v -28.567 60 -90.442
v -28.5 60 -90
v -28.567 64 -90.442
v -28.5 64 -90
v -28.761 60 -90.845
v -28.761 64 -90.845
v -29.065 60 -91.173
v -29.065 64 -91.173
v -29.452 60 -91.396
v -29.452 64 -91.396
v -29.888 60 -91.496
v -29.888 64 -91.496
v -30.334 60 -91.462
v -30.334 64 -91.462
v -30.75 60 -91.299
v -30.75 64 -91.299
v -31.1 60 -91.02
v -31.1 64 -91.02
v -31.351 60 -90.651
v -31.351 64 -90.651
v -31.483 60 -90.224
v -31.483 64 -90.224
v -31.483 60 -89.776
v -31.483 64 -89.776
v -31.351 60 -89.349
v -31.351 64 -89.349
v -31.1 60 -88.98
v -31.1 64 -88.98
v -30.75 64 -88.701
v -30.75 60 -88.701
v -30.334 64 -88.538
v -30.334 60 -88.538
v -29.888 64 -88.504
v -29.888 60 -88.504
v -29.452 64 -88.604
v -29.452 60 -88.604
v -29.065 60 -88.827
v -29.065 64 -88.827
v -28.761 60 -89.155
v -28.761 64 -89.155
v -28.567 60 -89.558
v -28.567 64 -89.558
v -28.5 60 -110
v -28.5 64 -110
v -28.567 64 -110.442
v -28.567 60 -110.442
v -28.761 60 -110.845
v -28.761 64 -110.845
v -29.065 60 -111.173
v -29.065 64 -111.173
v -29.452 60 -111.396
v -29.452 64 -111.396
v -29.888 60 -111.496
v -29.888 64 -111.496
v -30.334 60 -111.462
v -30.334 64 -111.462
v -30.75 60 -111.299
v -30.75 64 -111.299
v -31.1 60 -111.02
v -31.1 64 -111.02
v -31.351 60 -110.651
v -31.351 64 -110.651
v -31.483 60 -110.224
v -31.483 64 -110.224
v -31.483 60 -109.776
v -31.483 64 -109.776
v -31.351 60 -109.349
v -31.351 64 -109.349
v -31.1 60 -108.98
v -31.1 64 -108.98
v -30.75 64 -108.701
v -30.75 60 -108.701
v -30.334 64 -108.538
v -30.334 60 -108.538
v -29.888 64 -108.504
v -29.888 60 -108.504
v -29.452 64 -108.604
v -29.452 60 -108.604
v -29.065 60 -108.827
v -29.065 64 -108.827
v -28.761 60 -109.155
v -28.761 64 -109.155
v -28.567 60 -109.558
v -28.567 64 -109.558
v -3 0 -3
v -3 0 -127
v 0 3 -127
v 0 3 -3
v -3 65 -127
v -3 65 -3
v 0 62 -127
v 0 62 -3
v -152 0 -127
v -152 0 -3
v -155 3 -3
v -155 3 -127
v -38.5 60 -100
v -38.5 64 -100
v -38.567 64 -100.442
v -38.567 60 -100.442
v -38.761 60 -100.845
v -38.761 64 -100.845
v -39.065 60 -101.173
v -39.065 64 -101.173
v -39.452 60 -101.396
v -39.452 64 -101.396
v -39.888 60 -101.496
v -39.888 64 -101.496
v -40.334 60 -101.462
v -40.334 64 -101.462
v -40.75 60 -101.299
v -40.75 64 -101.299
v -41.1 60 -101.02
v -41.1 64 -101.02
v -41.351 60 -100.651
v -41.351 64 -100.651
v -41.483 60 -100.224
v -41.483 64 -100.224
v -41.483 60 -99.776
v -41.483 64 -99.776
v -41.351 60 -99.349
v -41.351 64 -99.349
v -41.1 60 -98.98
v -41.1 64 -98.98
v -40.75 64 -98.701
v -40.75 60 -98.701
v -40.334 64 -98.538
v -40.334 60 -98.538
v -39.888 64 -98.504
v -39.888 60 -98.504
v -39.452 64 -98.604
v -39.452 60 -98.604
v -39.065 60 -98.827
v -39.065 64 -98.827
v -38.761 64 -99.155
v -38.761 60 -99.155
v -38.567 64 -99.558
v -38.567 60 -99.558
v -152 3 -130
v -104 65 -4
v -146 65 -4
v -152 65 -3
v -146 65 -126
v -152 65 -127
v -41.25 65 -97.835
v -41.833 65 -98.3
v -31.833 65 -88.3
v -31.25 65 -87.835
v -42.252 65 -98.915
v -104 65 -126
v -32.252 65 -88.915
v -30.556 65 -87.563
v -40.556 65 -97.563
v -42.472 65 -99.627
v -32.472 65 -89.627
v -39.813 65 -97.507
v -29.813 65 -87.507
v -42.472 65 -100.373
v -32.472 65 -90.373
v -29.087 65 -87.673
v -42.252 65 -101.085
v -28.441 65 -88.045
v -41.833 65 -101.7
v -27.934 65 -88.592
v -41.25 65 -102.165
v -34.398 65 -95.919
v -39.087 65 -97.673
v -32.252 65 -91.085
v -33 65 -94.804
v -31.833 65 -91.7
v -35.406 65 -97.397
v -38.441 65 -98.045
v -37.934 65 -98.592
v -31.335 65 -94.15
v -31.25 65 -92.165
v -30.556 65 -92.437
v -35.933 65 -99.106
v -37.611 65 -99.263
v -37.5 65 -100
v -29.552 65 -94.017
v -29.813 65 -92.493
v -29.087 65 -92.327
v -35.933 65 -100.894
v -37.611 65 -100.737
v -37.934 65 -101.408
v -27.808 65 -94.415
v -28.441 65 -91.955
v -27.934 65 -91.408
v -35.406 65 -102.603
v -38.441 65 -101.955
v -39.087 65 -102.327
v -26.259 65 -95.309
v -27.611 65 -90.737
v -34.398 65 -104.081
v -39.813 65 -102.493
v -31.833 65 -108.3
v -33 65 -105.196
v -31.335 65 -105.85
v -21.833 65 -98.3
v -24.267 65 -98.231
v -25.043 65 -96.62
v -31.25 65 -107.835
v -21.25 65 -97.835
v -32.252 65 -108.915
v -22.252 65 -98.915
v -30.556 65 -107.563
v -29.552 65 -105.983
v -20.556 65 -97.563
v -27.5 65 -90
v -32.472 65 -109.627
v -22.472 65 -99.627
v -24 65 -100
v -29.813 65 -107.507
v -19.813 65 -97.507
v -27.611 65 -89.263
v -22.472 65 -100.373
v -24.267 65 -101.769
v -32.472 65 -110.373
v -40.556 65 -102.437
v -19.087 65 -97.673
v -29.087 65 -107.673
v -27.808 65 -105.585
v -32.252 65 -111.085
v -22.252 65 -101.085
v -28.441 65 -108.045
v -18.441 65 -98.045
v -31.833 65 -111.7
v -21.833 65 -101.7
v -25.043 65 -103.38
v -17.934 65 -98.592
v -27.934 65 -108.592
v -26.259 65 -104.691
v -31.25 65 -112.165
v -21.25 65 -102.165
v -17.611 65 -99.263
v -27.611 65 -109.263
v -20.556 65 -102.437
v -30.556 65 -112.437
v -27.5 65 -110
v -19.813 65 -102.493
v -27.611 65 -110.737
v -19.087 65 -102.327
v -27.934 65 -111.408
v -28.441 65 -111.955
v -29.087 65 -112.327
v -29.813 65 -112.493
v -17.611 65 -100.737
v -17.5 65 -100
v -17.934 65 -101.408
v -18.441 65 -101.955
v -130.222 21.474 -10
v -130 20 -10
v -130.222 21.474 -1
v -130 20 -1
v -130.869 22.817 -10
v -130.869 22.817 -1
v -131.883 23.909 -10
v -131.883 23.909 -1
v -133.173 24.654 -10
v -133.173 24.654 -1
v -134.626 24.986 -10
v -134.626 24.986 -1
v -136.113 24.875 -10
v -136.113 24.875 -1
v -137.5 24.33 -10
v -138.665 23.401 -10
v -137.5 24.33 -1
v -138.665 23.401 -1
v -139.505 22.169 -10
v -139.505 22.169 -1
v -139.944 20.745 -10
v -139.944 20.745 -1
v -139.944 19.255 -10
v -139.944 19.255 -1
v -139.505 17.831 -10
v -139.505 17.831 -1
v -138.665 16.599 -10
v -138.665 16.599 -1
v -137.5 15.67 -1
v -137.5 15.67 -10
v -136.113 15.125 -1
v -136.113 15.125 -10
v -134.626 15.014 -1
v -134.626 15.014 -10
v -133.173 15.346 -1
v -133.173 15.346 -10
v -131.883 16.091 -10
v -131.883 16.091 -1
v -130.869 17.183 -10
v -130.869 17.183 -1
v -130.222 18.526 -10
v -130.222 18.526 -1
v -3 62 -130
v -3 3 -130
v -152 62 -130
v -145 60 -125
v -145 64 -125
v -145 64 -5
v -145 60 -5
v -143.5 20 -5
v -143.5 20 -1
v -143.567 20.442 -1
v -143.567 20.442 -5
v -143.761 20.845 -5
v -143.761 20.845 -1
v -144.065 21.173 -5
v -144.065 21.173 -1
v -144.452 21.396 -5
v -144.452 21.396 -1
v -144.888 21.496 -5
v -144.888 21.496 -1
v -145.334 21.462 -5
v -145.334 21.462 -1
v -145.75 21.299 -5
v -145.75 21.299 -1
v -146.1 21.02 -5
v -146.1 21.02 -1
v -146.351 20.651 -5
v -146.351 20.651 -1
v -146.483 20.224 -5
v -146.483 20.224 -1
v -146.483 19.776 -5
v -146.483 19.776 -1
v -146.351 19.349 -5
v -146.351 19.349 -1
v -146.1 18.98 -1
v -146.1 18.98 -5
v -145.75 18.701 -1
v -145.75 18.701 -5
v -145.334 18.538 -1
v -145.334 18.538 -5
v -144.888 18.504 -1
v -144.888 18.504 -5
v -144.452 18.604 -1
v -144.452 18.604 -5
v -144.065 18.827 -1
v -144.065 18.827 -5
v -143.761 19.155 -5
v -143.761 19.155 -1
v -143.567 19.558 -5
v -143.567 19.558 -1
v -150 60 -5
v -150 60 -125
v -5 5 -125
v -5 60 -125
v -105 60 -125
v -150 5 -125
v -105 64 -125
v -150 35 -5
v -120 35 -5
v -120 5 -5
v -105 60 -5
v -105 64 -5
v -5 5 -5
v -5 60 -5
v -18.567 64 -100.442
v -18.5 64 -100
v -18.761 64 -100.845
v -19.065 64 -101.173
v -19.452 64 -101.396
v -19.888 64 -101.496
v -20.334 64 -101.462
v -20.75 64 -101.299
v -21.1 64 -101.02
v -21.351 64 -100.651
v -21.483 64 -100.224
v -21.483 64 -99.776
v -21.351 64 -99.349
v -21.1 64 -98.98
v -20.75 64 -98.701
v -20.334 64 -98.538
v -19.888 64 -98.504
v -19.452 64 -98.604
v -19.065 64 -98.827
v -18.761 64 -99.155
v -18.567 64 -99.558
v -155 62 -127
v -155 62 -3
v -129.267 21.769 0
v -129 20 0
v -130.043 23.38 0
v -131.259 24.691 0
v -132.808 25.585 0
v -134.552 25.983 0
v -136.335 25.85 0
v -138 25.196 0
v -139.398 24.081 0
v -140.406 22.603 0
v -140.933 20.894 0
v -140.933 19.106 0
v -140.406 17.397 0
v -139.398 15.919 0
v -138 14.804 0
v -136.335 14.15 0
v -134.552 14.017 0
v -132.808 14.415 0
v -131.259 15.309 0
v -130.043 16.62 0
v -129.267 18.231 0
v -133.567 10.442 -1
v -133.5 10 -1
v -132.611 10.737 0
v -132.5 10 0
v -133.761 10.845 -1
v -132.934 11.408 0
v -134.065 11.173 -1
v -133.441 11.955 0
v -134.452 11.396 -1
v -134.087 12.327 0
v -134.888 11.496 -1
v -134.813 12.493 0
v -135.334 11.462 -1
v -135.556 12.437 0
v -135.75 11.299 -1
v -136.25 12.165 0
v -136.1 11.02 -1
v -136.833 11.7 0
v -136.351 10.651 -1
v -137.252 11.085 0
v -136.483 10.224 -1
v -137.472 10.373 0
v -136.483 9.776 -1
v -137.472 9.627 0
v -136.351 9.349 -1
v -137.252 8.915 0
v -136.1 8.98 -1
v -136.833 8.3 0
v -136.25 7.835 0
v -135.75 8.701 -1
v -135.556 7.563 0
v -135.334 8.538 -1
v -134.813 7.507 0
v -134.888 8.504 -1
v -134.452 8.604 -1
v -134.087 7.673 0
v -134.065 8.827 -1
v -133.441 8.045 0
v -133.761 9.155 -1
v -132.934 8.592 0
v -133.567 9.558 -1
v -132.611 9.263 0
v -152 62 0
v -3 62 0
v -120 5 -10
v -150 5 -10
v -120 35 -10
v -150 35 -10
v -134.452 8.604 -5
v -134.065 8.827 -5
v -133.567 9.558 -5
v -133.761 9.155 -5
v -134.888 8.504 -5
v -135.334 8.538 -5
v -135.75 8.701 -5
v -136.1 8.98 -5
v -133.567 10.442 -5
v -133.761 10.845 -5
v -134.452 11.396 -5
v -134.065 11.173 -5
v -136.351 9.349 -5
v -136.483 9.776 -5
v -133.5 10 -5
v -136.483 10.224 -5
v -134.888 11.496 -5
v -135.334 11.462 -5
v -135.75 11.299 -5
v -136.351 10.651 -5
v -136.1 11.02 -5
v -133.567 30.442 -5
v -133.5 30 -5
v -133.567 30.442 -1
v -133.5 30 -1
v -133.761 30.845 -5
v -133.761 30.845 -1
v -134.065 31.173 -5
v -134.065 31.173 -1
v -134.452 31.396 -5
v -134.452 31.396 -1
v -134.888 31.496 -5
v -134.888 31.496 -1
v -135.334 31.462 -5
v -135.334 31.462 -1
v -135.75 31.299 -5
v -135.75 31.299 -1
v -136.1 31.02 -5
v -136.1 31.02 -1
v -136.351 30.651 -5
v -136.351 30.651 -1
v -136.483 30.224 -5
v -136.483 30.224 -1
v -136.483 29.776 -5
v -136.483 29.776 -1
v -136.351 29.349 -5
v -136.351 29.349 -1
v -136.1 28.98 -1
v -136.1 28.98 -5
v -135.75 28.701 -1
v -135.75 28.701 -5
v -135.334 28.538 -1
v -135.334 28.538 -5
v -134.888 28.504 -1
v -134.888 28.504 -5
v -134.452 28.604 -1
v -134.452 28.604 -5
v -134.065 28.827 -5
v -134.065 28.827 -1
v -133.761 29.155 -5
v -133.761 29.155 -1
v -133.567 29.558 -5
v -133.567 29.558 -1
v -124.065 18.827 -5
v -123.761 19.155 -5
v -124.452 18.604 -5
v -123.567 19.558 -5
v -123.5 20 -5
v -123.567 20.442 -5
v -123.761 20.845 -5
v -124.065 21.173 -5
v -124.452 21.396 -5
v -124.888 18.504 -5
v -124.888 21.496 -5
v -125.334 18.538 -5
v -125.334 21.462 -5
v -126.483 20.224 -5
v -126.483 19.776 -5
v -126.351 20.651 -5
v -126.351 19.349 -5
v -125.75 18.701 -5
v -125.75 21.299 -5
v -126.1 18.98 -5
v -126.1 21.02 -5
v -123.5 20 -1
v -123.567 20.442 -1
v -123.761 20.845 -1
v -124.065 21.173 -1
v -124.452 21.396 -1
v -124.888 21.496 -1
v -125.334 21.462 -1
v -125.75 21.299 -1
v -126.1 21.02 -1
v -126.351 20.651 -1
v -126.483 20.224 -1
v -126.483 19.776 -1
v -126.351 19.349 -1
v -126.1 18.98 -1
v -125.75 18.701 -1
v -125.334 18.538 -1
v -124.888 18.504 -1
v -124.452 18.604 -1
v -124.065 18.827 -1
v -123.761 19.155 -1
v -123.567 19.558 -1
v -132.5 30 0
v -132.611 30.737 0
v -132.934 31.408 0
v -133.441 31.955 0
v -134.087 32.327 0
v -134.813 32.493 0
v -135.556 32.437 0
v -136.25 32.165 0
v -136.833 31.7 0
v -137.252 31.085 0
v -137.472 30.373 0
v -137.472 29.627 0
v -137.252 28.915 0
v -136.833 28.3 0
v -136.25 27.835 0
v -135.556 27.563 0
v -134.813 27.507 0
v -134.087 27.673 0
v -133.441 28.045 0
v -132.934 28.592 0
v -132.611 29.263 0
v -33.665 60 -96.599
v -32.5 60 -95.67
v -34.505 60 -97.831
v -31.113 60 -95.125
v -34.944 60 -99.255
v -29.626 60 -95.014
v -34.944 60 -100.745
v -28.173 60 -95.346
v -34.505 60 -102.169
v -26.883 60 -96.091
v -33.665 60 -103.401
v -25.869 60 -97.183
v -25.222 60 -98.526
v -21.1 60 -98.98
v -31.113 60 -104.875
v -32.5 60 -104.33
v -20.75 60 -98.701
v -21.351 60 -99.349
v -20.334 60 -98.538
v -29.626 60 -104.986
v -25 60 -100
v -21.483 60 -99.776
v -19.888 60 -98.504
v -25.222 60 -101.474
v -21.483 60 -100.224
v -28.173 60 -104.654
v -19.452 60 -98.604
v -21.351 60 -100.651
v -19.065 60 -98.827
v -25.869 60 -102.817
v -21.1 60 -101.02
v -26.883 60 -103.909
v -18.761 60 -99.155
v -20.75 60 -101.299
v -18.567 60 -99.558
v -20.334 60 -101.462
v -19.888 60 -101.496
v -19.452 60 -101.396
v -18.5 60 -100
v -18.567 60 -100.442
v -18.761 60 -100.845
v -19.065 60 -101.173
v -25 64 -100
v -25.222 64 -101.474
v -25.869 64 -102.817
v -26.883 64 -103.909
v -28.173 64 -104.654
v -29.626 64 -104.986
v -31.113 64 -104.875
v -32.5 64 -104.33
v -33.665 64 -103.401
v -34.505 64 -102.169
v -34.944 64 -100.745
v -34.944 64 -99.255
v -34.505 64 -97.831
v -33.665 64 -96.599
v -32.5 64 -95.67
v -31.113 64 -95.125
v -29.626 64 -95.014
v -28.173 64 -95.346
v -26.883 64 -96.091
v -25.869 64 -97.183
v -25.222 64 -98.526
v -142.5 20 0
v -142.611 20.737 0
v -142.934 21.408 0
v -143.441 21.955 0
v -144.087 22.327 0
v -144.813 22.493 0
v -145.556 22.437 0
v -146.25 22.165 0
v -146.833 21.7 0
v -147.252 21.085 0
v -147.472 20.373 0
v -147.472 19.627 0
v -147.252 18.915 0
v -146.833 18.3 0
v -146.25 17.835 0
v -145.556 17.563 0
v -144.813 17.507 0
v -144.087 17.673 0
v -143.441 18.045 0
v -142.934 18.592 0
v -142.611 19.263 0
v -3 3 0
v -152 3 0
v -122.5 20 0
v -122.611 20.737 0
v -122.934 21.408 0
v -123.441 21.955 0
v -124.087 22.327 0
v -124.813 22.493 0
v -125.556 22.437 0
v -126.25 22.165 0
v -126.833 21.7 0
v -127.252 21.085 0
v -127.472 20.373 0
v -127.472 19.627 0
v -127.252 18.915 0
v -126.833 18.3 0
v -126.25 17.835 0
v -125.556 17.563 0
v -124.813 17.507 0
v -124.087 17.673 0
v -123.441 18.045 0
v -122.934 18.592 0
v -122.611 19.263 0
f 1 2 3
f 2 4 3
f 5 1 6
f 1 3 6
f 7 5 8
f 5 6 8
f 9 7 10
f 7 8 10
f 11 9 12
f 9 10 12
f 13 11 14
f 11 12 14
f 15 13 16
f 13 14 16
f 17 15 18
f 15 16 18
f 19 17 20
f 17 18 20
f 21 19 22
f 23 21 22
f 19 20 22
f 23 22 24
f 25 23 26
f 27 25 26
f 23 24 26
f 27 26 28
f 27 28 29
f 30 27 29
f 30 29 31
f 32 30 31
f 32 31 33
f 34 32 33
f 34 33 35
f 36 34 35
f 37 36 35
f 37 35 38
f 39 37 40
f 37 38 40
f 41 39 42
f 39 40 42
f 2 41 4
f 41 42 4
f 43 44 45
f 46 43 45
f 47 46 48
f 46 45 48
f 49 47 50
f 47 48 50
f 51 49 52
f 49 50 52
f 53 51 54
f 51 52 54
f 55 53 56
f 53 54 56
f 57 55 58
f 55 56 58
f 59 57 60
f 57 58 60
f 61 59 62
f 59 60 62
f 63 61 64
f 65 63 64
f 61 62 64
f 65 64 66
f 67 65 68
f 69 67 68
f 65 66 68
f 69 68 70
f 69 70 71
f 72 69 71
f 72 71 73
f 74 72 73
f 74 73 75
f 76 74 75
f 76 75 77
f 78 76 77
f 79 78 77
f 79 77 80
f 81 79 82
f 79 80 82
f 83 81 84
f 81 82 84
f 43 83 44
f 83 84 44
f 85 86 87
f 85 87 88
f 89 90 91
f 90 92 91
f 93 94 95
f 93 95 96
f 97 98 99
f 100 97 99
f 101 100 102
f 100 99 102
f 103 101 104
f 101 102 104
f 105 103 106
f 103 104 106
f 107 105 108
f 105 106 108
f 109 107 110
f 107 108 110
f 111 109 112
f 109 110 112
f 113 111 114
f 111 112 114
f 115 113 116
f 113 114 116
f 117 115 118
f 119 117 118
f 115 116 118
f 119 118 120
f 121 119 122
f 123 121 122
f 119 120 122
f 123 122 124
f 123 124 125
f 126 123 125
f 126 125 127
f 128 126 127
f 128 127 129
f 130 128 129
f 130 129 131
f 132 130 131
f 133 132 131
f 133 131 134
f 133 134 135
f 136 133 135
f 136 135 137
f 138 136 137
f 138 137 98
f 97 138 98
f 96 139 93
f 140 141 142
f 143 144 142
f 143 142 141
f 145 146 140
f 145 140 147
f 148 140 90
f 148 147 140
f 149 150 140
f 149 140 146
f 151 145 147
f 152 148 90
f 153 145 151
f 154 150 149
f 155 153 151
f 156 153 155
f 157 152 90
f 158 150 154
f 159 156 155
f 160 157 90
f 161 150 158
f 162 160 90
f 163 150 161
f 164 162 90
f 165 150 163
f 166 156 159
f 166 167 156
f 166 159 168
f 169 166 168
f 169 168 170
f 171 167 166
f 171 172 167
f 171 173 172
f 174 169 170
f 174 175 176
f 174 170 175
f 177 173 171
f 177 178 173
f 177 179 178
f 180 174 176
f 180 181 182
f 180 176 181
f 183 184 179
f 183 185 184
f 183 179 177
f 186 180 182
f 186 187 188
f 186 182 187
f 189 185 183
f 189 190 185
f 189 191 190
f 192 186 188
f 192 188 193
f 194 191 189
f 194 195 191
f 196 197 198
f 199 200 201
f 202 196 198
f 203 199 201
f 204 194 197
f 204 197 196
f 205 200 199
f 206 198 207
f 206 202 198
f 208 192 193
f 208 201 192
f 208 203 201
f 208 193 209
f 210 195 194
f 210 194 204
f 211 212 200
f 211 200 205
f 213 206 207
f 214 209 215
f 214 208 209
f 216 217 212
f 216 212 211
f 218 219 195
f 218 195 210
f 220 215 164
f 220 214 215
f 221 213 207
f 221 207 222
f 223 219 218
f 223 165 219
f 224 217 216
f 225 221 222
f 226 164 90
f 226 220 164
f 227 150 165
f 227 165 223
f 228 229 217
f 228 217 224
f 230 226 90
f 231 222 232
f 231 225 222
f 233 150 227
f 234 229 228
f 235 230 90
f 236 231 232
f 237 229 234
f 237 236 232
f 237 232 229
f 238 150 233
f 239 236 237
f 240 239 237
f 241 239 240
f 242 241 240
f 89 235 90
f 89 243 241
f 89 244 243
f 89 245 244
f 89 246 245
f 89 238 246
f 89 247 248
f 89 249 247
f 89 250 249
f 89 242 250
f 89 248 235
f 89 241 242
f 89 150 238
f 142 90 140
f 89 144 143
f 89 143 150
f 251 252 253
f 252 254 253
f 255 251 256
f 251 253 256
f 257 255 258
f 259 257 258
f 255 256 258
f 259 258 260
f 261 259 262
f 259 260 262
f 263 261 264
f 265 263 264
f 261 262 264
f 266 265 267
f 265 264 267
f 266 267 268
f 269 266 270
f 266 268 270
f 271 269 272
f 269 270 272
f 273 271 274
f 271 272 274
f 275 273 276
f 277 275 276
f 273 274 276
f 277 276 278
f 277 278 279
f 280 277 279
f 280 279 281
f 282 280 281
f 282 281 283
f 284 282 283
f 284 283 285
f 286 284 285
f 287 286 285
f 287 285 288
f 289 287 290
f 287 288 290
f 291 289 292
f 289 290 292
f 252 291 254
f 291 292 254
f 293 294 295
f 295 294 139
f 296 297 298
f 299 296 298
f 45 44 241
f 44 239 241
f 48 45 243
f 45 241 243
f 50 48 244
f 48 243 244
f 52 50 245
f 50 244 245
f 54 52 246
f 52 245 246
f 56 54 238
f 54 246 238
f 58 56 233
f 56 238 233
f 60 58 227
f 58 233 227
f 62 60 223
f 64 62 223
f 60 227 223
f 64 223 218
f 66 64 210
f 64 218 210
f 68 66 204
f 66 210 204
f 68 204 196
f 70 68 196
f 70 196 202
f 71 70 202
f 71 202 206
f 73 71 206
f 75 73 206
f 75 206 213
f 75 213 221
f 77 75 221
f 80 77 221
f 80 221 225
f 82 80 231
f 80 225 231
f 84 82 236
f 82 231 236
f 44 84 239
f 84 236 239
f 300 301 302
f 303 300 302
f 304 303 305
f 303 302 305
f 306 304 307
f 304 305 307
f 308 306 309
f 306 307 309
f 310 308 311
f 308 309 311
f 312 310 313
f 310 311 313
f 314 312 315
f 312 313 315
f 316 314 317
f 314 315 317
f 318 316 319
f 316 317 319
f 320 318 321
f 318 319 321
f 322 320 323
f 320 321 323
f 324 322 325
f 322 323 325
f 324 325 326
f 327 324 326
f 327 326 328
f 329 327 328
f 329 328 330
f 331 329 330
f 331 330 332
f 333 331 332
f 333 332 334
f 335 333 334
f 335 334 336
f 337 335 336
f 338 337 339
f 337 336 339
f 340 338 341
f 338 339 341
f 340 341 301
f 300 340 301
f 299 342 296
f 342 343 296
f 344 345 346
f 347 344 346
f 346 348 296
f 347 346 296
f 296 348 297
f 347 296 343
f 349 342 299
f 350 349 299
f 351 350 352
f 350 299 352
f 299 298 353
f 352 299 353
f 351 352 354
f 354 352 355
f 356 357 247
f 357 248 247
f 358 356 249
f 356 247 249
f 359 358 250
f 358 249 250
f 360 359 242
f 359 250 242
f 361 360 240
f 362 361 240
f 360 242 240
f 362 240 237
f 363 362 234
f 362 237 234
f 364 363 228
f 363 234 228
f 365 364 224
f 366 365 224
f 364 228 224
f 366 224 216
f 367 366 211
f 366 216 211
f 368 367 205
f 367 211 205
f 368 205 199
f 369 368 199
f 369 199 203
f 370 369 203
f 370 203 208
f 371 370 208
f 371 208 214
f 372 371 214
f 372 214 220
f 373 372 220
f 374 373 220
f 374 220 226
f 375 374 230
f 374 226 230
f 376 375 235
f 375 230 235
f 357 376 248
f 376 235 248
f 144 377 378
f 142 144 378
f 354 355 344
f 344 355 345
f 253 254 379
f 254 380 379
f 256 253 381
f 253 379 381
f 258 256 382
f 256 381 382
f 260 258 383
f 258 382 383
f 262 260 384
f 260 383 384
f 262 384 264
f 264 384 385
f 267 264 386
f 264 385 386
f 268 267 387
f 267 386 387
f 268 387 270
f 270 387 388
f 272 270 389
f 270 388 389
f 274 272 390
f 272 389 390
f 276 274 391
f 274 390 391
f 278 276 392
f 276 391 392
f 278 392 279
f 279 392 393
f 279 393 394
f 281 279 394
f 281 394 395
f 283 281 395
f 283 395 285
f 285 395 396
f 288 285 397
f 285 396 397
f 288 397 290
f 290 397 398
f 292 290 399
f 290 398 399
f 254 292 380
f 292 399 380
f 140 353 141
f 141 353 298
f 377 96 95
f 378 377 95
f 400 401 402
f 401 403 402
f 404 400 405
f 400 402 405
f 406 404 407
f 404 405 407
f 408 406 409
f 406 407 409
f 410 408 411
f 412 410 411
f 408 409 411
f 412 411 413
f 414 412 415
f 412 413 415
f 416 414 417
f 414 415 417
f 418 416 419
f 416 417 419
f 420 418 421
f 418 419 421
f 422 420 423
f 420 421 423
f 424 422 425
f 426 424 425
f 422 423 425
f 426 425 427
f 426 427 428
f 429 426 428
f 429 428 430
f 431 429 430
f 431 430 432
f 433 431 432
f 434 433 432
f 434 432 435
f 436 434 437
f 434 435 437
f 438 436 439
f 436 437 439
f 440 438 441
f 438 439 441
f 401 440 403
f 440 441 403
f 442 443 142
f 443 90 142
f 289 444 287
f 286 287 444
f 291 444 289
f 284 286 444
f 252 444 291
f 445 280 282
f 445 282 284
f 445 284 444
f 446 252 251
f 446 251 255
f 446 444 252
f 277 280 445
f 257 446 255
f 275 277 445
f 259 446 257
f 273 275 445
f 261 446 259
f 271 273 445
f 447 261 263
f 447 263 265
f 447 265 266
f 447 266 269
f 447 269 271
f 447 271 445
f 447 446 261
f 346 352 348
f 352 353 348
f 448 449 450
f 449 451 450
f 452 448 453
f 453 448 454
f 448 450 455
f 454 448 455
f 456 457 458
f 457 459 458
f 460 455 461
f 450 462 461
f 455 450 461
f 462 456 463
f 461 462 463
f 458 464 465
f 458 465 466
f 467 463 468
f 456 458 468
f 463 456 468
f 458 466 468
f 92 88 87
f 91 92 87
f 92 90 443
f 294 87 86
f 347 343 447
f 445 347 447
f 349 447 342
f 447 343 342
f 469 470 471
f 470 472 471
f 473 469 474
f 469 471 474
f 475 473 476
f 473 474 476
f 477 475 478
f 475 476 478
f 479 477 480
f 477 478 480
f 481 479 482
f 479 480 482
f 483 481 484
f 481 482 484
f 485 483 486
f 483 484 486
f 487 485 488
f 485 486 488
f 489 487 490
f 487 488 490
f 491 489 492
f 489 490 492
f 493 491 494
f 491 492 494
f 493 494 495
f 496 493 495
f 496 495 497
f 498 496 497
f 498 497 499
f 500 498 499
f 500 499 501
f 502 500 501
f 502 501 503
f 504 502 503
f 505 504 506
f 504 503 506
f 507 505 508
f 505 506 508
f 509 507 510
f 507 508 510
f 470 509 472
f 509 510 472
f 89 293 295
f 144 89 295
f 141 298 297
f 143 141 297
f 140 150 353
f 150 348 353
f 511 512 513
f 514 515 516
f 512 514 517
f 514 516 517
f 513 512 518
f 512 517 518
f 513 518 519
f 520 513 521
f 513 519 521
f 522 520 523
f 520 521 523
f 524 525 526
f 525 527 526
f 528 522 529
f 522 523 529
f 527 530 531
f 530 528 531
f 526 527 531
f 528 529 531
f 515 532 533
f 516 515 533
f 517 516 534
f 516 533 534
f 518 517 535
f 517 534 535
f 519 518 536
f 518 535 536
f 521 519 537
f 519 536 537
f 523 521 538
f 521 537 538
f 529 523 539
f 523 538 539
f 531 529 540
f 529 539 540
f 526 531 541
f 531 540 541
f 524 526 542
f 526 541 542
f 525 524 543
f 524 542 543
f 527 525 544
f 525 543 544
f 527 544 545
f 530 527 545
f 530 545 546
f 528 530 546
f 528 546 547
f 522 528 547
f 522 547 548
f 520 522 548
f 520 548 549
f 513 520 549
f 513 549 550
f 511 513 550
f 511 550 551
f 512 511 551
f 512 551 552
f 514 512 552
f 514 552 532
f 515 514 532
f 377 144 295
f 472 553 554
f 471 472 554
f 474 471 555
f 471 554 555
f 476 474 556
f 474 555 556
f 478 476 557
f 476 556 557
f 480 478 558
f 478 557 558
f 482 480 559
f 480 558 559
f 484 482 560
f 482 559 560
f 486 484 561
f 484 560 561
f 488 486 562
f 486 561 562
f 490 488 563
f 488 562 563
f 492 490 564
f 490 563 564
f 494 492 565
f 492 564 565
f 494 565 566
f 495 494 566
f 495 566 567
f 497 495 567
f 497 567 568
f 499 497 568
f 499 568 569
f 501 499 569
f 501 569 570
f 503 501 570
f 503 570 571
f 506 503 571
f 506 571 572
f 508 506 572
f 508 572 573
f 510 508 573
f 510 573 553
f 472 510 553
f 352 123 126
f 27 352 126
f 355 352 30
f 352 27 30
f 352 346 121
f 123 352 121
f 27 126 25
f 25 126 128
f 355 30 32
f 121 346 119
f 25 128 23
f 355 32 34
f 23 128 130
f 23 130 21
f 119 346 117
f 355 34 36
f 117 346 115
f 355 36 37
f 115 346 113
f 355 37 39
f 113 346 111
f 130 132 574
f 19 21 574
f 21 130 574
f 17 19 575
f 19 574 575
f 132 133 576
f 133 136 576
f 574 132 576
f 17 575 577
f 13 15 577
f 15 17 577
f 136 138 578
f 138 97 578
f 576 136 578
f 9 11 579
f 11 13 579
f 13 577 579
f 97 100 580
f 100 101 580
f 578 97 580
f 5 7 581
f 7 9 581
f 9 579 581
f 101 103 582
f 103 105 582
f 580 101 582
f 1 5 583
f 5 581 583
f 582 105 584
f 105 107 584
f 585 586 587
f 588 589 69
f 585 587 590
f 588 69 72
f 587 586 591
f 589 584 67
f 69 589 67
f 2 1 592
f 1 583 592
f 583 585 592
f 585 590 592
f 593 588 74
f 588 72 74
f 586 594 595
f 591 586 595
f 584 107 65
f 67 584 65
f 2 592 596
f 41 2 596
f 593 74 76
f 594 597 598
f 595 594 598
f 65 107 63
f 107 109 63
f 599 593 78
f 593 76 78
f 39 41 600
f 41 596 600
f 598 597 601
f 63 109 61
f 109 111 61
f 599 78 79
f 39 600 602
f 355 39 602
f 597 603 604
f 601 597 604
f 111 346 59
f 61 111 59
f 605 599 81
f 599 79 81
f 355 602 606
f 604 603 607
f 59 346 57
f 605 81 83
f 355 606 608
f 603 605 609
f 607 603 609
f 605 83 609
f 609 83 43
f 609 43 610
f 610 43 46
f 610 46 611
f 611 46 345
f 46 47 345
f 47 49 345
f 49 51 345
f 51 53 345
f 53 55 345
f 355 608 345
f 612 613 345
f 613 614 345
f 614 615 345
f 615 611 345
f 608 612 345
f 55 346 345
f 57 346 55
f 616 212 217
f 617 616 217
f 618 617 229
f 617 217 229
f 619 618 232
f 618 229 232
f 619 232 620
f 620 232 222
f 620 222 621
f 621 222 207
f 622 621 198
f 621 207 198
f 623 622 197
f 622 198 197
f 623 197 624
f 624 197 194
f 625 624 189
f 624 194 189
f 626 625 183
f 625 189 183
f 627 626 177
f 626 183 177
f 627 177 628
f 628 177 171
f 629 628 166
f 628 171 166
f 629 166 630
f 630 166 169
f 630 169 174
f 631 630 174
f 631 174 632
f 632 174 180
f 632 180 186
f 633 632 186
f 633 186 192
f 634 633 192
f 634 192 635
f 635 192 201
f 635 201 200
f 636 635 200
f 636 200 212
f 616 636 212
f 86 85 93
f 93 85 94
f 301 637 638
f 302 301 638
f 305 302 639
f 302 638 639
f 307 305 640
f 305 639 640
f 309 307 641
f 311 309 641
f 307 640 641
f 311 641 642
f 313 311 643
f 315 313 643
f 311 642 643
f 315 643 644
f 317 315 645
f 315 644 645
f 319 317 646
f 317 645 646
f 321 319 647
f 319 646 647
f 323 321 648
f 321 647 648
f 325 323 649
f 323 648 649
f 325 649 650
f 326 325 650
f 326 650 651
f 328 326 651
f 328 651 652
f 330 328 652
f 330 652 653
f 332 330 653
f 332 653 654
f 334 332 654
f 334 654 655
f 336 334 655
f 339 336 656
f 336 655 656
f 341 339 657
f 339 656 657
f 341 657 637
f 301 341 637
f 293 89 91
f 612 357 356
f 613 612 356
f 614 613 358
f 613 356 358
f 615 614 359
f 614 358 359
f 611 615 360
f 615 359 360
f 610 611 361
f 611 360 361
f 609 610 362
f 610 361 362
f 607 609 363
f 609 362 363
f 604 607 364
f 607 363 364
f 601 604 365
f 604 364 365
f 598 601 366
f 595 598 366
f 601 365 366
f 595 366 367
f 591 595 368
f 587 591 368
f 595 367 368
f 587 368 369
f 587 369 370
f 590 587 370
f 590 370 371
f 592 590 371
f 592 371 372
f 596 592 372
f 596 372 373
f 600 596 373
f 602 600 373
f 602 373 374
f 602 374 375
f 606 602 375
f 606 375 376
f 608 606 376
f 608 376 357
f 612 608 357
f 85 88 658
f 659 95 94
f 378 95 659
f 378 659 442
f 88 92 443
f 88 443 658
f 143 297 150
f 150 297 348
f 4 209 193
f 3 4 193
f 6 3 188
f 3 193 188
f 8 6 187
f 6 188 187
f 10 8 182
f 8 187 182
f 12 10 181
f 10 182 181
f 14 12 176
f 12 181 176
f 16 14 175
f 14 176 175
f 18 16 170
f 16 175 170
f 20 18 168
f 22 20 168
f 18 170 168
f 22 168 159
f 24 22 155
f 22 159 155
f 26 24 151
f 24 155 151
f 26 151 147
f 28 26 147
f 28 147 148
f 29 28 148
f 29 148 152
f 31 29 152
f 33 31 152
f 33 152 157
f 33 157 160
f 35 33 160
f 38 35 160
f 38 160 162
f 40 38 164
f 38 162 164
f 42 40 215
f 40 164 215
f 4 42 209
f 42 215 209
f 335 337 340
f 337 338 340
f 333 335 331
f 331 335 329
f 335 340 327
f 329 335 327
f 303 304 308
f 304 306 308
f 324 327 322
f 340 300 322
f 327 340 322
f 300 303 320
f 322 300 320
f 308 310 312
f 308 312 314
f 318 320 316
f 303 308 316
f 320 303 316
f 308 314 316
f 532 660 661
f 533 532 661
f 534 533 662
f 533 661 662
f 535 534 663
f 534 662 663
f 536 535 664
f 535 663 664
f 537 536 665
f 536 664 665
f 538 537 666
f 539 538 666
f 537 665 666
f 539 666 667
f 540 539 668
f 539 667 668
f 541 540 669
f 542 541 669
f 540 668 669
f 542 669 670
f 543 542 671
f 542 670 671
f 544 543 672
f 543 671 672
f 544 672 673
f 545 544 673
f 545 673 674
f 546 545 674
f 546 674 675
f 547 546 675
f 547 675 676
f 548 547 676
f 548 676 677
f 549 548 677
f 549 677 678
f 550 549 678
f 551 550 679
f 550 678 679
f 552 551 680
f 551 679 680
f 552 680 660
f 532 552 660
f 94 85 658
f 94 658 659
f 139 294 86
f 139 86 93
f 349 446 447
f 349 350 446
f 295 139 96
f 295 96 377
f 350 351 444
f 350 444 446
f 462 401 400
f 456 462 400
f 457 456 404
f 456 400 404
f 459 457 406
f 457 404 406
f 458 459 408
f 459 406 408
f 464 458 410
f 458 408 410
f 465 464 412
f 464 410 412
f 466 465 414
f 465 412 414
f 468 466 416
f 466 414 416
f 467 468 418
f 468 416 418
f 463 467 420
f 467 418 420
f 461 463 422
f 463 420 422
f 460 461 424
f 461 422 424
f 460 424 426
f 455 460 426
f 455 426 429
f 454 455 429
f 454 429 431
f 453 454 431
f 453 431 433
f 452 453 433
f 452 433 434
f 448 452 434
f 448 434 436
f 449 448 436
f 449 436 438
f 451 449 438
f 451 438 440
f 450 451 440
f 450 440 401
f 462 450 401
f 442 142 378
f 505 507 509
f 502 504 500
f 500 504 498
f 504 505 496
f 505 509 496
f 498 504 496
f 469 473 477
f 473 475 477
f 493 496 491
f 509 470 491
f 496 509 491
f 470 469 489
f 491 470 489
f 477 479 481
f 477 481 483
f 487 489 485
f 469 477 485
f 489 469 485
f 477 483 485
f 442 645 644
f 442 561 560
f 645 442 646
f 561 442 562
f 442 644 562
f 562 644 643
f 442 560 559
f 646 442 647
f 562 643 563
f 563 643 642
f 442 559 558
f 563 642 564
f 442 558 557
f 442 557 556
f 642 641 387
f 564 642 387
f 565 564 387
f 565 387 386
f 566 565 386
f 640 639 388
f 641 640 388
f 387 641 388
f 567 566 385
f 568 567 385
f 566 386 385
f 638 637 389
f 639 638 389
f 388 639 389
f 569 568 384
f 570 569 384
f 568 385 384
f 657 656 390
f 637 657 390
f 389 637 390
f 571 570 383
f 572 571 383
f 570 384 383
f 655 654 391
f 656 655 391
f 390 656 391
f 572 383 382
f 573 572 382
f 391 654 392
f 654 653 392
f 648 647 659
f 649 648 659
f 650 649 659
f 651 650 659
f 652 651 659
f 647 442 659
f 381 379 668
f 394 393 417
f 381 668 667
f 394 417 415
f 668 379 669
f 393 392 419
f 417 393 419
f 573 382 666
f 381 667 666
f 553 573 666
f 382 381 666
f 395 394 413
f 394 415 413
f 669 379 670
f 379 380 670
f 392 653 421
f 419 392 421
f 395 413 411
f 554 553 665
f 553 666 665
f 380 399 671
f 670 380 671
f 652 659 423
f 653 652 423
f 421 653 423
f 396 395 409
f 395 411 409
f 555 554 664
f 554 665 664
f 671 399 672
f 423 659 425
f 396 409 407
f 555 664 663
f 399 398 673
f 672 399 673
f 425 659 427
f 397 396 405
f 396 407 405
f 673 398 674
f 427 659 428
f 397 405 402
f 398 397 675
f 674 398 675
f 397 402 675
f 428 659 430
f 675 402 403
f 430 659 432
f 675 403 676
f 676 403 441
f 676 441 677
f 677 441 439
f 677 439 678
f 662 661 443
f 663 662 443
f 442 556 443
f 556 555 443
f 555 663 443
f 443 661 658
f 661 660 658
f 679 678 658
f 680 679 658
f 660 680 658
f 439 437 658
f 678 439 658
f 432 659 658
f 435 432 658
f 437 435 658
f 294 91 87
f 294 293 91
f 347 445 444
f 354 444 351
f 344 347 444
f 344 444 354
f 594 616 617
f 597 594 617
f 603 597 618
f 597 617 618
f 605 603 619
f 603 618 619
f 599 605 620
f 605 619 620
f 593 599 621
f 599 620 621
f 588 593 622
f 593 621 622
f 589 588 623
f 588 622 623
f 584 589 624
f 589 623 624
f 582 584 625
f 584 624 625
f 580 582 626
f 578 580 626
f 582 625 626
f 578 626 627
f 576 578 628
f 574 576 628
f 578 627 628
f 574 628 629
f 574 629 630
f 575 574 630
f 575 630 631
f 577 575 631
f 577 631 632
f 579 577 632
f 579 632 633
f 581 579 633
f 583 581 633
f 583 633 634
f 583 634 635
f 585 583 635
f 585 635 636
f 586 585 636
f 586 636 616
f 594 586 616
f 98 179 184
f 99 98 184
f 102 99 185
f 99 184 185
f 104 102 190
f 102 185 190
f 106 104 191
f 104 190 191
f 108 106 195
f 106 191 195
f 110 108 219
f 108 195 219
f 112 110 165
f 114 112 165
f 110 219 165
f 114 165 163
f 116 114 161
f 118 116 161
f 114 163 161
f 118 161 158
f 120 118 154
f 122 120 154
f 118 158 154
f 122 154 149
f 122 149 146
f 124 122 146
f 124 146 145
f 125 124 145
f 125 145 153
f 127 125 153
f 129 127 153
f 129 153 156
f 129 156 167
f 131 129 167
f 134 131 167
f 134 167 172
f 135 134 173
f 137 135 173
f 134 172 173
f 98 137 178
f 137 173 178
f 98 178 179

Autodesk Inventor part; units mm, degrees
ref_plane "YZ Plane" through (0, 0, 0) normal (1, 0, 0) x (0, 1, 0)
ref_plane "XZ Plane" through (0, 0, 0) normal (0, 1, 0) x (-1, 0, 0)
ref_plane "XY Plane" through (0, 0, 0) normal (0, 0, 1) x (1, 0, 0)
sketch "Sketch1" plane through (0, 0, 0) normal (0, 1, 0) x (-1, 0, 0)
  line L0 (0, 0) -> (155, 0)
  line L1 (155, 0) -> (155, -130)
  line L2 (155, -130) -> (0, -130)
  line L3 (0, -130) -> (0, 0)
  dimension "d0" = 130
  dimension "d1" = 155
extrude "Extrusion1" add sketch "Sketch1" along normal blind 60
sketch "Sketch2" plane through (0, 60, 0) normal (0, 1, 0) x (1, 0, 0)
  line L0 (-150, 5) -> (-5, 5)
  line L1 (-5, 5) -> (-5, 125)
  line L2 (-5, 125) -> (-150, 125)
  line L3 (-150, 125) -> (-150, 5)
  line L4 (-155, 0) -> (0, 0) projected
  line L5 (0, 130) -> (-155, 130) projected
  line L6 (-155, 130) -> (-155, 0) projected
  line L7 (0, 0) -> (0, 130) projected
  point P0 (-77.5, 130)
  dimension "d4" = 5
  dimension "d5" = 5
  dimension "d6" = 5
  dimension "d7" = 5
extrude "Extrusion2" cut sketch "Sketch2" against normal blind 55 contours L3 L2 L1 L0
sketch "Sketch3" plane through (0, 60, 0) normal (0, 1, 0) x (1, 0, 0)
  line L0 (-155, 0) -> (0, 0) projected
  line L1 (-155, 0) -> (0, 0)
  line L2 (0, 0) -> (0, 130)
  line L3 (0, 130) -> (-155, 130)
  line L4 (-155, 130) -> (-155, 0)
extrude "Extrusion3" add sketch "Sketch3" along normal blind 5
sketch "Sketch4" plane through (0, 65, 0) normal (0, 1, 0) x (1, 0, 0)
  circle A0 centre (-30, 100) radius 5
  line L0 (0, 130) -> (-155, 130) projected
  line L1 (0, 0) -> (0, 130) projected
  dimension "d12" = 10
  dimension "d13" = 30
  dimension "d14" = 30
extrude "Extrusion4" cut sketch "Sketch4" against normal blind 5
sketch "Sketch5" plane through (-155, 0, 0) normal (0, 0, 1) x (1, 0, 0)
  circle A0 centre (20, 20) radius 5
  line L0 (0, 0) -> (155, 0) projected
  line L1 (0, 0) -> (0, 65) projected
  dimension "d17" = 20
  dimension "d18" = 20
  dimension "d19" = 10
extrude "Extrusion5" cut sketch "Sketch5" against normal blind 20
sketch "Sketch6" plane through (0, 65, 0) normal (0, 1, 0) x (1, 0, 0)
  line L0 (-145, 5) -> (-105, 5)
  line L1 (-105, 5) -> (-105, 125)
  line L2 (-105, 125) -> (-145, 125)
  line L3 (-145, 125) -> (-145, 5)
  line L4 (-155, 130) -> (-155, 0) projected
  line L5 (0, 130) -> (-155, 130) projected
  line L6 (-155, 0) -> (0, 0) projected
  point P0 (-125, 5)
  dimension "d22" = 10
  dimension "d23" = 5
  dimension "d24" = 5
  dimension "d25" = 40
extrude "Extrusion6" cut sketch "Sketch6" against normal blind 5
sketch "Sketch7" plane through (-155, 0, 0) normal (0, 0, 1) x (1, 0, 0)
  circle A0 centre (20, 30) radius 1.5
  circle A1 centre (20, 20) radius 5 projected
  circle A2 centre (20, 20) radius 5
  circle A3 centre (10, 20) radius 1.5
  circle A4 centre (20, 10) radius 1.5
  circle A5 centre (30, 20) radius 1.5
  point P0 (155, 0)
  dimension "d28" = 3
  dimension "d31" = 360
  dimension "d35" = 10
extrude "Extrusion7" cut sketch "Sketch7" against normal blind 5 contours A0 | A3 | A4 | A5
sketch "Sketch8" plane through (0, 65, 0) normal (0, 1, 0) x (1, 0, 0)
  point P0 (0, 0)
sketch "Sketch9" plane through (0, 65, 0) normal (0, 1, 0) x (1, 0, 0)
  point P0 (0, 0)
sketch "Sketch10" plane through (0, 65, 0) normal (0, 1, 0) x (1, 0, 0)
  point P0 (0, 0)
chamfer "Chamfer1" distance 1 angle 45 4 edges at (-126.5, 20, 0) (-136.5, 30, 0) (-136.5, 10, 0) (-146.5, 20, 0)
chamfer "Chamfer3" distance 1 angle 45 4 edges at (-105, 65, -65) (-125, 65, -125) (-145, 65, -65) (-125, 65, -5)
sketch "Sketch12" plane through (-5, 5, -5) normal (0, 0, -1) x (-1, 0, 0)
  line L0 (0, 0) -> (145, 0) projected
  line L1 (145, 0) -> (115, 0)
  line L2 (115, 0) -> (115, 30)
  line L3 (115, 30) -> (145, 30)
  line L4 (145, 30) -> (145, 0)
  point P0 (-5, -5)
  point P1 (115, 0)
  dimension "d53" = 30
  dimension "d54" = 30
extrude "Extrusion9" add sketch "Sketch12" along normal blind 5
sketch "Sketch13" plane through (-155, 0, 0) normal (0, 0, 1) x (1, 0, 0)
  point P0 (155, 0)
sketch "Sketch14" plane through (-135, 20, -5) normal (0, 0, 1) x (1, 0, 0)
  circle A0 centre (0, 0) radius 5
  point P0 (135, -20)
extrude "Extrusion10" cut sketch "Sketch14" against normal blind 20
chamfer "Chamfer4" distance 1 angle 45 2 edges at (-35, 65, -100) (-140, 20, 0)
chamfer "Chamfer5" distance 3 angle 45 12 edges at (0, 65, -65) (-77.5, 65, 0) (-155, 65, -65) (-77.5, 65, -130) (0, 32.5, 0) (0, 32.5, -130) (-155, 32.5, -130) (-155, 32.5, 0) (0, 0, -65) (-77.5, 0, -130) (-155, 0, -65) (-77.5, 0, 0)
sketch "Sketch15" plane through (0, 65, 0) normal (0, 1, 0) x (1, 0, 0)
  point P0 (0, 0)
sketch "Sketch16" plane through (0, 65, 0) normal (0, 1, 0) x (1, 0, 0)
  point P0 (0, 0)
sketch "Sketch17" plane through (-152, 3, 0) normal (0, 0, 1) x (1, 0, 0)
  point P0 (152, -3)
sketch "Sketch18" plane through (-152, 3, 0) normal (0, 0, 1) x (1, 0, 0)
  point P0 (152, -3)
sketch "Sketch19" plane through (-152, 3, 0) normal (0, 0, 1) x (1, 0, 0)
  point P0 (152, -3)
sketch "Sketch20" plane through (0, 65, 0) normal (0, 1, 0) x (1, 0, 0)
  point P0 (0, 0)
sketch "Sketch21" plane through (-152, 3, 0) normal (0, 0, 1) x (1, 0, 0)
  point P0 (152, -3)
sketch "Sketch22" plane through (0, 65, 0) normal (0, 1, 0) x (1, 0, 0)
  circle A0 centre (-30, 110) radius 1.5
  circle A1 centre (-30, 100) radius 5 projected
  circle A2 centre (-40, 100) radius 1.5
  circle A3 centre (-30, 90) radius 1.5
  circle A4 centre (-20, 100) radius 1.5
  point P0 (0, 0)
  dimension "d66" = 3
  dimension "d67" = 10
  dimension "d70" = 360
sketch "Sketch23" plane through (-152, 3, 0) normal (0, 0, 1) x (1, 0, 0)
  point P0 (152, -3)
extrude "Extrusion11" cut sketch "Sketch22" against normal blind 10 contours A0 | A2 | A3 | A4
chamfer "Chamfer6" distance 1 angle 45 4 edges at (-21.5, 65, -100) (-31.5, 65, -110) (-41.5, 65, -100) (-31.5, 65, -90)
sketch "Sketch24" plane through (-152, 3, 0) normal (0, 0, 1) x (1, 0, 0)
  point P0 (152, -3)
equation "\"BendRadius\" = Thickness"
equation "\"BendReliefWidth\" = Thickness"
equation "\"BendReliefDepth\" = 0.5 * Thickness"
equation "\"CornerReliefSize\" = 4 * Thickness"
equation "\"MinimumRemnant\" = 2 * Thickness"
equation "\"TransitionRadius\" = BendRadius"
equation "\"JacobiRadiusSize\" = BendRadius"
equation "\"GapSize\" = Thickness"
equation "\"Thickness\" = 0.5"
properties part number "Water container"
